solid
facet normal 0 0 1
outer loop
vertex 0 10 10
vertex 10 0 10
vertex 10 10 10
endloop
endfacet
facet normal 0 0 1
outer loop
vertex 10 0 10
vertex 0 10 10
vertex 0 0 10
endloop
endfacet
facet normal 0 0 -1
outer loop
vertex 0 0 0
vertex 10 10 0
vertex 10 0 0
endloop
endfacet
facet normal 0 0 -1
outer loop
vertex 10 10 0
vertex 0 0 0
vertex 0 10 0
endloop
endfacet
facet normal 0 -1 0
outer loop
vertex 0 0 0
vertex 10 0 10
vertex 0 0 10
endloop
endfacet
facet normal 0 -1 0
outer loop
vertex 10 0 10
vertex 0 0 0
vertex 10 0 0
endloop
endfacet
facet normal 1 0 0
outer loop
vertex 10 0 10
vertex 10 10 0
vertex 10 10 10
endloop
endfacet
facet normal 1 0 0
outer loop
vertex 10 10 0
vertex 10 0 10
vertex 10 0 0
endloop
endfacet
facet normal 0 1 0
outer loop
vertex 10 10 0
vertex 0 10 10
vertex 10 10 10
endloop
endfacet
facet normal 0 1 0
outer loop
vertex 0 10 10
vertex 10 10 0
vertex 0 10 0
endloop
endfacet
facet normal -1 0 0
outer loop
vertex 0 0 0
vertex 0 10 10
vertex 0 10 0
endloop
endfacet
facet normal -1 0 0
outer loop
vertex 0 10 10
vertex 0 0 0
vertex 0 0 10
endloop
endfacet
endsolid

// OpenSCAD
cube(10,10,10);

/*translate([2.5,-2.5,2.5]) {
	difference() {
		cube(5,5,5);
		translate([-.5,-1,-.5]) {
			scale([1,3,1])
				cube(3,3,3);
		}
	}
}*/
